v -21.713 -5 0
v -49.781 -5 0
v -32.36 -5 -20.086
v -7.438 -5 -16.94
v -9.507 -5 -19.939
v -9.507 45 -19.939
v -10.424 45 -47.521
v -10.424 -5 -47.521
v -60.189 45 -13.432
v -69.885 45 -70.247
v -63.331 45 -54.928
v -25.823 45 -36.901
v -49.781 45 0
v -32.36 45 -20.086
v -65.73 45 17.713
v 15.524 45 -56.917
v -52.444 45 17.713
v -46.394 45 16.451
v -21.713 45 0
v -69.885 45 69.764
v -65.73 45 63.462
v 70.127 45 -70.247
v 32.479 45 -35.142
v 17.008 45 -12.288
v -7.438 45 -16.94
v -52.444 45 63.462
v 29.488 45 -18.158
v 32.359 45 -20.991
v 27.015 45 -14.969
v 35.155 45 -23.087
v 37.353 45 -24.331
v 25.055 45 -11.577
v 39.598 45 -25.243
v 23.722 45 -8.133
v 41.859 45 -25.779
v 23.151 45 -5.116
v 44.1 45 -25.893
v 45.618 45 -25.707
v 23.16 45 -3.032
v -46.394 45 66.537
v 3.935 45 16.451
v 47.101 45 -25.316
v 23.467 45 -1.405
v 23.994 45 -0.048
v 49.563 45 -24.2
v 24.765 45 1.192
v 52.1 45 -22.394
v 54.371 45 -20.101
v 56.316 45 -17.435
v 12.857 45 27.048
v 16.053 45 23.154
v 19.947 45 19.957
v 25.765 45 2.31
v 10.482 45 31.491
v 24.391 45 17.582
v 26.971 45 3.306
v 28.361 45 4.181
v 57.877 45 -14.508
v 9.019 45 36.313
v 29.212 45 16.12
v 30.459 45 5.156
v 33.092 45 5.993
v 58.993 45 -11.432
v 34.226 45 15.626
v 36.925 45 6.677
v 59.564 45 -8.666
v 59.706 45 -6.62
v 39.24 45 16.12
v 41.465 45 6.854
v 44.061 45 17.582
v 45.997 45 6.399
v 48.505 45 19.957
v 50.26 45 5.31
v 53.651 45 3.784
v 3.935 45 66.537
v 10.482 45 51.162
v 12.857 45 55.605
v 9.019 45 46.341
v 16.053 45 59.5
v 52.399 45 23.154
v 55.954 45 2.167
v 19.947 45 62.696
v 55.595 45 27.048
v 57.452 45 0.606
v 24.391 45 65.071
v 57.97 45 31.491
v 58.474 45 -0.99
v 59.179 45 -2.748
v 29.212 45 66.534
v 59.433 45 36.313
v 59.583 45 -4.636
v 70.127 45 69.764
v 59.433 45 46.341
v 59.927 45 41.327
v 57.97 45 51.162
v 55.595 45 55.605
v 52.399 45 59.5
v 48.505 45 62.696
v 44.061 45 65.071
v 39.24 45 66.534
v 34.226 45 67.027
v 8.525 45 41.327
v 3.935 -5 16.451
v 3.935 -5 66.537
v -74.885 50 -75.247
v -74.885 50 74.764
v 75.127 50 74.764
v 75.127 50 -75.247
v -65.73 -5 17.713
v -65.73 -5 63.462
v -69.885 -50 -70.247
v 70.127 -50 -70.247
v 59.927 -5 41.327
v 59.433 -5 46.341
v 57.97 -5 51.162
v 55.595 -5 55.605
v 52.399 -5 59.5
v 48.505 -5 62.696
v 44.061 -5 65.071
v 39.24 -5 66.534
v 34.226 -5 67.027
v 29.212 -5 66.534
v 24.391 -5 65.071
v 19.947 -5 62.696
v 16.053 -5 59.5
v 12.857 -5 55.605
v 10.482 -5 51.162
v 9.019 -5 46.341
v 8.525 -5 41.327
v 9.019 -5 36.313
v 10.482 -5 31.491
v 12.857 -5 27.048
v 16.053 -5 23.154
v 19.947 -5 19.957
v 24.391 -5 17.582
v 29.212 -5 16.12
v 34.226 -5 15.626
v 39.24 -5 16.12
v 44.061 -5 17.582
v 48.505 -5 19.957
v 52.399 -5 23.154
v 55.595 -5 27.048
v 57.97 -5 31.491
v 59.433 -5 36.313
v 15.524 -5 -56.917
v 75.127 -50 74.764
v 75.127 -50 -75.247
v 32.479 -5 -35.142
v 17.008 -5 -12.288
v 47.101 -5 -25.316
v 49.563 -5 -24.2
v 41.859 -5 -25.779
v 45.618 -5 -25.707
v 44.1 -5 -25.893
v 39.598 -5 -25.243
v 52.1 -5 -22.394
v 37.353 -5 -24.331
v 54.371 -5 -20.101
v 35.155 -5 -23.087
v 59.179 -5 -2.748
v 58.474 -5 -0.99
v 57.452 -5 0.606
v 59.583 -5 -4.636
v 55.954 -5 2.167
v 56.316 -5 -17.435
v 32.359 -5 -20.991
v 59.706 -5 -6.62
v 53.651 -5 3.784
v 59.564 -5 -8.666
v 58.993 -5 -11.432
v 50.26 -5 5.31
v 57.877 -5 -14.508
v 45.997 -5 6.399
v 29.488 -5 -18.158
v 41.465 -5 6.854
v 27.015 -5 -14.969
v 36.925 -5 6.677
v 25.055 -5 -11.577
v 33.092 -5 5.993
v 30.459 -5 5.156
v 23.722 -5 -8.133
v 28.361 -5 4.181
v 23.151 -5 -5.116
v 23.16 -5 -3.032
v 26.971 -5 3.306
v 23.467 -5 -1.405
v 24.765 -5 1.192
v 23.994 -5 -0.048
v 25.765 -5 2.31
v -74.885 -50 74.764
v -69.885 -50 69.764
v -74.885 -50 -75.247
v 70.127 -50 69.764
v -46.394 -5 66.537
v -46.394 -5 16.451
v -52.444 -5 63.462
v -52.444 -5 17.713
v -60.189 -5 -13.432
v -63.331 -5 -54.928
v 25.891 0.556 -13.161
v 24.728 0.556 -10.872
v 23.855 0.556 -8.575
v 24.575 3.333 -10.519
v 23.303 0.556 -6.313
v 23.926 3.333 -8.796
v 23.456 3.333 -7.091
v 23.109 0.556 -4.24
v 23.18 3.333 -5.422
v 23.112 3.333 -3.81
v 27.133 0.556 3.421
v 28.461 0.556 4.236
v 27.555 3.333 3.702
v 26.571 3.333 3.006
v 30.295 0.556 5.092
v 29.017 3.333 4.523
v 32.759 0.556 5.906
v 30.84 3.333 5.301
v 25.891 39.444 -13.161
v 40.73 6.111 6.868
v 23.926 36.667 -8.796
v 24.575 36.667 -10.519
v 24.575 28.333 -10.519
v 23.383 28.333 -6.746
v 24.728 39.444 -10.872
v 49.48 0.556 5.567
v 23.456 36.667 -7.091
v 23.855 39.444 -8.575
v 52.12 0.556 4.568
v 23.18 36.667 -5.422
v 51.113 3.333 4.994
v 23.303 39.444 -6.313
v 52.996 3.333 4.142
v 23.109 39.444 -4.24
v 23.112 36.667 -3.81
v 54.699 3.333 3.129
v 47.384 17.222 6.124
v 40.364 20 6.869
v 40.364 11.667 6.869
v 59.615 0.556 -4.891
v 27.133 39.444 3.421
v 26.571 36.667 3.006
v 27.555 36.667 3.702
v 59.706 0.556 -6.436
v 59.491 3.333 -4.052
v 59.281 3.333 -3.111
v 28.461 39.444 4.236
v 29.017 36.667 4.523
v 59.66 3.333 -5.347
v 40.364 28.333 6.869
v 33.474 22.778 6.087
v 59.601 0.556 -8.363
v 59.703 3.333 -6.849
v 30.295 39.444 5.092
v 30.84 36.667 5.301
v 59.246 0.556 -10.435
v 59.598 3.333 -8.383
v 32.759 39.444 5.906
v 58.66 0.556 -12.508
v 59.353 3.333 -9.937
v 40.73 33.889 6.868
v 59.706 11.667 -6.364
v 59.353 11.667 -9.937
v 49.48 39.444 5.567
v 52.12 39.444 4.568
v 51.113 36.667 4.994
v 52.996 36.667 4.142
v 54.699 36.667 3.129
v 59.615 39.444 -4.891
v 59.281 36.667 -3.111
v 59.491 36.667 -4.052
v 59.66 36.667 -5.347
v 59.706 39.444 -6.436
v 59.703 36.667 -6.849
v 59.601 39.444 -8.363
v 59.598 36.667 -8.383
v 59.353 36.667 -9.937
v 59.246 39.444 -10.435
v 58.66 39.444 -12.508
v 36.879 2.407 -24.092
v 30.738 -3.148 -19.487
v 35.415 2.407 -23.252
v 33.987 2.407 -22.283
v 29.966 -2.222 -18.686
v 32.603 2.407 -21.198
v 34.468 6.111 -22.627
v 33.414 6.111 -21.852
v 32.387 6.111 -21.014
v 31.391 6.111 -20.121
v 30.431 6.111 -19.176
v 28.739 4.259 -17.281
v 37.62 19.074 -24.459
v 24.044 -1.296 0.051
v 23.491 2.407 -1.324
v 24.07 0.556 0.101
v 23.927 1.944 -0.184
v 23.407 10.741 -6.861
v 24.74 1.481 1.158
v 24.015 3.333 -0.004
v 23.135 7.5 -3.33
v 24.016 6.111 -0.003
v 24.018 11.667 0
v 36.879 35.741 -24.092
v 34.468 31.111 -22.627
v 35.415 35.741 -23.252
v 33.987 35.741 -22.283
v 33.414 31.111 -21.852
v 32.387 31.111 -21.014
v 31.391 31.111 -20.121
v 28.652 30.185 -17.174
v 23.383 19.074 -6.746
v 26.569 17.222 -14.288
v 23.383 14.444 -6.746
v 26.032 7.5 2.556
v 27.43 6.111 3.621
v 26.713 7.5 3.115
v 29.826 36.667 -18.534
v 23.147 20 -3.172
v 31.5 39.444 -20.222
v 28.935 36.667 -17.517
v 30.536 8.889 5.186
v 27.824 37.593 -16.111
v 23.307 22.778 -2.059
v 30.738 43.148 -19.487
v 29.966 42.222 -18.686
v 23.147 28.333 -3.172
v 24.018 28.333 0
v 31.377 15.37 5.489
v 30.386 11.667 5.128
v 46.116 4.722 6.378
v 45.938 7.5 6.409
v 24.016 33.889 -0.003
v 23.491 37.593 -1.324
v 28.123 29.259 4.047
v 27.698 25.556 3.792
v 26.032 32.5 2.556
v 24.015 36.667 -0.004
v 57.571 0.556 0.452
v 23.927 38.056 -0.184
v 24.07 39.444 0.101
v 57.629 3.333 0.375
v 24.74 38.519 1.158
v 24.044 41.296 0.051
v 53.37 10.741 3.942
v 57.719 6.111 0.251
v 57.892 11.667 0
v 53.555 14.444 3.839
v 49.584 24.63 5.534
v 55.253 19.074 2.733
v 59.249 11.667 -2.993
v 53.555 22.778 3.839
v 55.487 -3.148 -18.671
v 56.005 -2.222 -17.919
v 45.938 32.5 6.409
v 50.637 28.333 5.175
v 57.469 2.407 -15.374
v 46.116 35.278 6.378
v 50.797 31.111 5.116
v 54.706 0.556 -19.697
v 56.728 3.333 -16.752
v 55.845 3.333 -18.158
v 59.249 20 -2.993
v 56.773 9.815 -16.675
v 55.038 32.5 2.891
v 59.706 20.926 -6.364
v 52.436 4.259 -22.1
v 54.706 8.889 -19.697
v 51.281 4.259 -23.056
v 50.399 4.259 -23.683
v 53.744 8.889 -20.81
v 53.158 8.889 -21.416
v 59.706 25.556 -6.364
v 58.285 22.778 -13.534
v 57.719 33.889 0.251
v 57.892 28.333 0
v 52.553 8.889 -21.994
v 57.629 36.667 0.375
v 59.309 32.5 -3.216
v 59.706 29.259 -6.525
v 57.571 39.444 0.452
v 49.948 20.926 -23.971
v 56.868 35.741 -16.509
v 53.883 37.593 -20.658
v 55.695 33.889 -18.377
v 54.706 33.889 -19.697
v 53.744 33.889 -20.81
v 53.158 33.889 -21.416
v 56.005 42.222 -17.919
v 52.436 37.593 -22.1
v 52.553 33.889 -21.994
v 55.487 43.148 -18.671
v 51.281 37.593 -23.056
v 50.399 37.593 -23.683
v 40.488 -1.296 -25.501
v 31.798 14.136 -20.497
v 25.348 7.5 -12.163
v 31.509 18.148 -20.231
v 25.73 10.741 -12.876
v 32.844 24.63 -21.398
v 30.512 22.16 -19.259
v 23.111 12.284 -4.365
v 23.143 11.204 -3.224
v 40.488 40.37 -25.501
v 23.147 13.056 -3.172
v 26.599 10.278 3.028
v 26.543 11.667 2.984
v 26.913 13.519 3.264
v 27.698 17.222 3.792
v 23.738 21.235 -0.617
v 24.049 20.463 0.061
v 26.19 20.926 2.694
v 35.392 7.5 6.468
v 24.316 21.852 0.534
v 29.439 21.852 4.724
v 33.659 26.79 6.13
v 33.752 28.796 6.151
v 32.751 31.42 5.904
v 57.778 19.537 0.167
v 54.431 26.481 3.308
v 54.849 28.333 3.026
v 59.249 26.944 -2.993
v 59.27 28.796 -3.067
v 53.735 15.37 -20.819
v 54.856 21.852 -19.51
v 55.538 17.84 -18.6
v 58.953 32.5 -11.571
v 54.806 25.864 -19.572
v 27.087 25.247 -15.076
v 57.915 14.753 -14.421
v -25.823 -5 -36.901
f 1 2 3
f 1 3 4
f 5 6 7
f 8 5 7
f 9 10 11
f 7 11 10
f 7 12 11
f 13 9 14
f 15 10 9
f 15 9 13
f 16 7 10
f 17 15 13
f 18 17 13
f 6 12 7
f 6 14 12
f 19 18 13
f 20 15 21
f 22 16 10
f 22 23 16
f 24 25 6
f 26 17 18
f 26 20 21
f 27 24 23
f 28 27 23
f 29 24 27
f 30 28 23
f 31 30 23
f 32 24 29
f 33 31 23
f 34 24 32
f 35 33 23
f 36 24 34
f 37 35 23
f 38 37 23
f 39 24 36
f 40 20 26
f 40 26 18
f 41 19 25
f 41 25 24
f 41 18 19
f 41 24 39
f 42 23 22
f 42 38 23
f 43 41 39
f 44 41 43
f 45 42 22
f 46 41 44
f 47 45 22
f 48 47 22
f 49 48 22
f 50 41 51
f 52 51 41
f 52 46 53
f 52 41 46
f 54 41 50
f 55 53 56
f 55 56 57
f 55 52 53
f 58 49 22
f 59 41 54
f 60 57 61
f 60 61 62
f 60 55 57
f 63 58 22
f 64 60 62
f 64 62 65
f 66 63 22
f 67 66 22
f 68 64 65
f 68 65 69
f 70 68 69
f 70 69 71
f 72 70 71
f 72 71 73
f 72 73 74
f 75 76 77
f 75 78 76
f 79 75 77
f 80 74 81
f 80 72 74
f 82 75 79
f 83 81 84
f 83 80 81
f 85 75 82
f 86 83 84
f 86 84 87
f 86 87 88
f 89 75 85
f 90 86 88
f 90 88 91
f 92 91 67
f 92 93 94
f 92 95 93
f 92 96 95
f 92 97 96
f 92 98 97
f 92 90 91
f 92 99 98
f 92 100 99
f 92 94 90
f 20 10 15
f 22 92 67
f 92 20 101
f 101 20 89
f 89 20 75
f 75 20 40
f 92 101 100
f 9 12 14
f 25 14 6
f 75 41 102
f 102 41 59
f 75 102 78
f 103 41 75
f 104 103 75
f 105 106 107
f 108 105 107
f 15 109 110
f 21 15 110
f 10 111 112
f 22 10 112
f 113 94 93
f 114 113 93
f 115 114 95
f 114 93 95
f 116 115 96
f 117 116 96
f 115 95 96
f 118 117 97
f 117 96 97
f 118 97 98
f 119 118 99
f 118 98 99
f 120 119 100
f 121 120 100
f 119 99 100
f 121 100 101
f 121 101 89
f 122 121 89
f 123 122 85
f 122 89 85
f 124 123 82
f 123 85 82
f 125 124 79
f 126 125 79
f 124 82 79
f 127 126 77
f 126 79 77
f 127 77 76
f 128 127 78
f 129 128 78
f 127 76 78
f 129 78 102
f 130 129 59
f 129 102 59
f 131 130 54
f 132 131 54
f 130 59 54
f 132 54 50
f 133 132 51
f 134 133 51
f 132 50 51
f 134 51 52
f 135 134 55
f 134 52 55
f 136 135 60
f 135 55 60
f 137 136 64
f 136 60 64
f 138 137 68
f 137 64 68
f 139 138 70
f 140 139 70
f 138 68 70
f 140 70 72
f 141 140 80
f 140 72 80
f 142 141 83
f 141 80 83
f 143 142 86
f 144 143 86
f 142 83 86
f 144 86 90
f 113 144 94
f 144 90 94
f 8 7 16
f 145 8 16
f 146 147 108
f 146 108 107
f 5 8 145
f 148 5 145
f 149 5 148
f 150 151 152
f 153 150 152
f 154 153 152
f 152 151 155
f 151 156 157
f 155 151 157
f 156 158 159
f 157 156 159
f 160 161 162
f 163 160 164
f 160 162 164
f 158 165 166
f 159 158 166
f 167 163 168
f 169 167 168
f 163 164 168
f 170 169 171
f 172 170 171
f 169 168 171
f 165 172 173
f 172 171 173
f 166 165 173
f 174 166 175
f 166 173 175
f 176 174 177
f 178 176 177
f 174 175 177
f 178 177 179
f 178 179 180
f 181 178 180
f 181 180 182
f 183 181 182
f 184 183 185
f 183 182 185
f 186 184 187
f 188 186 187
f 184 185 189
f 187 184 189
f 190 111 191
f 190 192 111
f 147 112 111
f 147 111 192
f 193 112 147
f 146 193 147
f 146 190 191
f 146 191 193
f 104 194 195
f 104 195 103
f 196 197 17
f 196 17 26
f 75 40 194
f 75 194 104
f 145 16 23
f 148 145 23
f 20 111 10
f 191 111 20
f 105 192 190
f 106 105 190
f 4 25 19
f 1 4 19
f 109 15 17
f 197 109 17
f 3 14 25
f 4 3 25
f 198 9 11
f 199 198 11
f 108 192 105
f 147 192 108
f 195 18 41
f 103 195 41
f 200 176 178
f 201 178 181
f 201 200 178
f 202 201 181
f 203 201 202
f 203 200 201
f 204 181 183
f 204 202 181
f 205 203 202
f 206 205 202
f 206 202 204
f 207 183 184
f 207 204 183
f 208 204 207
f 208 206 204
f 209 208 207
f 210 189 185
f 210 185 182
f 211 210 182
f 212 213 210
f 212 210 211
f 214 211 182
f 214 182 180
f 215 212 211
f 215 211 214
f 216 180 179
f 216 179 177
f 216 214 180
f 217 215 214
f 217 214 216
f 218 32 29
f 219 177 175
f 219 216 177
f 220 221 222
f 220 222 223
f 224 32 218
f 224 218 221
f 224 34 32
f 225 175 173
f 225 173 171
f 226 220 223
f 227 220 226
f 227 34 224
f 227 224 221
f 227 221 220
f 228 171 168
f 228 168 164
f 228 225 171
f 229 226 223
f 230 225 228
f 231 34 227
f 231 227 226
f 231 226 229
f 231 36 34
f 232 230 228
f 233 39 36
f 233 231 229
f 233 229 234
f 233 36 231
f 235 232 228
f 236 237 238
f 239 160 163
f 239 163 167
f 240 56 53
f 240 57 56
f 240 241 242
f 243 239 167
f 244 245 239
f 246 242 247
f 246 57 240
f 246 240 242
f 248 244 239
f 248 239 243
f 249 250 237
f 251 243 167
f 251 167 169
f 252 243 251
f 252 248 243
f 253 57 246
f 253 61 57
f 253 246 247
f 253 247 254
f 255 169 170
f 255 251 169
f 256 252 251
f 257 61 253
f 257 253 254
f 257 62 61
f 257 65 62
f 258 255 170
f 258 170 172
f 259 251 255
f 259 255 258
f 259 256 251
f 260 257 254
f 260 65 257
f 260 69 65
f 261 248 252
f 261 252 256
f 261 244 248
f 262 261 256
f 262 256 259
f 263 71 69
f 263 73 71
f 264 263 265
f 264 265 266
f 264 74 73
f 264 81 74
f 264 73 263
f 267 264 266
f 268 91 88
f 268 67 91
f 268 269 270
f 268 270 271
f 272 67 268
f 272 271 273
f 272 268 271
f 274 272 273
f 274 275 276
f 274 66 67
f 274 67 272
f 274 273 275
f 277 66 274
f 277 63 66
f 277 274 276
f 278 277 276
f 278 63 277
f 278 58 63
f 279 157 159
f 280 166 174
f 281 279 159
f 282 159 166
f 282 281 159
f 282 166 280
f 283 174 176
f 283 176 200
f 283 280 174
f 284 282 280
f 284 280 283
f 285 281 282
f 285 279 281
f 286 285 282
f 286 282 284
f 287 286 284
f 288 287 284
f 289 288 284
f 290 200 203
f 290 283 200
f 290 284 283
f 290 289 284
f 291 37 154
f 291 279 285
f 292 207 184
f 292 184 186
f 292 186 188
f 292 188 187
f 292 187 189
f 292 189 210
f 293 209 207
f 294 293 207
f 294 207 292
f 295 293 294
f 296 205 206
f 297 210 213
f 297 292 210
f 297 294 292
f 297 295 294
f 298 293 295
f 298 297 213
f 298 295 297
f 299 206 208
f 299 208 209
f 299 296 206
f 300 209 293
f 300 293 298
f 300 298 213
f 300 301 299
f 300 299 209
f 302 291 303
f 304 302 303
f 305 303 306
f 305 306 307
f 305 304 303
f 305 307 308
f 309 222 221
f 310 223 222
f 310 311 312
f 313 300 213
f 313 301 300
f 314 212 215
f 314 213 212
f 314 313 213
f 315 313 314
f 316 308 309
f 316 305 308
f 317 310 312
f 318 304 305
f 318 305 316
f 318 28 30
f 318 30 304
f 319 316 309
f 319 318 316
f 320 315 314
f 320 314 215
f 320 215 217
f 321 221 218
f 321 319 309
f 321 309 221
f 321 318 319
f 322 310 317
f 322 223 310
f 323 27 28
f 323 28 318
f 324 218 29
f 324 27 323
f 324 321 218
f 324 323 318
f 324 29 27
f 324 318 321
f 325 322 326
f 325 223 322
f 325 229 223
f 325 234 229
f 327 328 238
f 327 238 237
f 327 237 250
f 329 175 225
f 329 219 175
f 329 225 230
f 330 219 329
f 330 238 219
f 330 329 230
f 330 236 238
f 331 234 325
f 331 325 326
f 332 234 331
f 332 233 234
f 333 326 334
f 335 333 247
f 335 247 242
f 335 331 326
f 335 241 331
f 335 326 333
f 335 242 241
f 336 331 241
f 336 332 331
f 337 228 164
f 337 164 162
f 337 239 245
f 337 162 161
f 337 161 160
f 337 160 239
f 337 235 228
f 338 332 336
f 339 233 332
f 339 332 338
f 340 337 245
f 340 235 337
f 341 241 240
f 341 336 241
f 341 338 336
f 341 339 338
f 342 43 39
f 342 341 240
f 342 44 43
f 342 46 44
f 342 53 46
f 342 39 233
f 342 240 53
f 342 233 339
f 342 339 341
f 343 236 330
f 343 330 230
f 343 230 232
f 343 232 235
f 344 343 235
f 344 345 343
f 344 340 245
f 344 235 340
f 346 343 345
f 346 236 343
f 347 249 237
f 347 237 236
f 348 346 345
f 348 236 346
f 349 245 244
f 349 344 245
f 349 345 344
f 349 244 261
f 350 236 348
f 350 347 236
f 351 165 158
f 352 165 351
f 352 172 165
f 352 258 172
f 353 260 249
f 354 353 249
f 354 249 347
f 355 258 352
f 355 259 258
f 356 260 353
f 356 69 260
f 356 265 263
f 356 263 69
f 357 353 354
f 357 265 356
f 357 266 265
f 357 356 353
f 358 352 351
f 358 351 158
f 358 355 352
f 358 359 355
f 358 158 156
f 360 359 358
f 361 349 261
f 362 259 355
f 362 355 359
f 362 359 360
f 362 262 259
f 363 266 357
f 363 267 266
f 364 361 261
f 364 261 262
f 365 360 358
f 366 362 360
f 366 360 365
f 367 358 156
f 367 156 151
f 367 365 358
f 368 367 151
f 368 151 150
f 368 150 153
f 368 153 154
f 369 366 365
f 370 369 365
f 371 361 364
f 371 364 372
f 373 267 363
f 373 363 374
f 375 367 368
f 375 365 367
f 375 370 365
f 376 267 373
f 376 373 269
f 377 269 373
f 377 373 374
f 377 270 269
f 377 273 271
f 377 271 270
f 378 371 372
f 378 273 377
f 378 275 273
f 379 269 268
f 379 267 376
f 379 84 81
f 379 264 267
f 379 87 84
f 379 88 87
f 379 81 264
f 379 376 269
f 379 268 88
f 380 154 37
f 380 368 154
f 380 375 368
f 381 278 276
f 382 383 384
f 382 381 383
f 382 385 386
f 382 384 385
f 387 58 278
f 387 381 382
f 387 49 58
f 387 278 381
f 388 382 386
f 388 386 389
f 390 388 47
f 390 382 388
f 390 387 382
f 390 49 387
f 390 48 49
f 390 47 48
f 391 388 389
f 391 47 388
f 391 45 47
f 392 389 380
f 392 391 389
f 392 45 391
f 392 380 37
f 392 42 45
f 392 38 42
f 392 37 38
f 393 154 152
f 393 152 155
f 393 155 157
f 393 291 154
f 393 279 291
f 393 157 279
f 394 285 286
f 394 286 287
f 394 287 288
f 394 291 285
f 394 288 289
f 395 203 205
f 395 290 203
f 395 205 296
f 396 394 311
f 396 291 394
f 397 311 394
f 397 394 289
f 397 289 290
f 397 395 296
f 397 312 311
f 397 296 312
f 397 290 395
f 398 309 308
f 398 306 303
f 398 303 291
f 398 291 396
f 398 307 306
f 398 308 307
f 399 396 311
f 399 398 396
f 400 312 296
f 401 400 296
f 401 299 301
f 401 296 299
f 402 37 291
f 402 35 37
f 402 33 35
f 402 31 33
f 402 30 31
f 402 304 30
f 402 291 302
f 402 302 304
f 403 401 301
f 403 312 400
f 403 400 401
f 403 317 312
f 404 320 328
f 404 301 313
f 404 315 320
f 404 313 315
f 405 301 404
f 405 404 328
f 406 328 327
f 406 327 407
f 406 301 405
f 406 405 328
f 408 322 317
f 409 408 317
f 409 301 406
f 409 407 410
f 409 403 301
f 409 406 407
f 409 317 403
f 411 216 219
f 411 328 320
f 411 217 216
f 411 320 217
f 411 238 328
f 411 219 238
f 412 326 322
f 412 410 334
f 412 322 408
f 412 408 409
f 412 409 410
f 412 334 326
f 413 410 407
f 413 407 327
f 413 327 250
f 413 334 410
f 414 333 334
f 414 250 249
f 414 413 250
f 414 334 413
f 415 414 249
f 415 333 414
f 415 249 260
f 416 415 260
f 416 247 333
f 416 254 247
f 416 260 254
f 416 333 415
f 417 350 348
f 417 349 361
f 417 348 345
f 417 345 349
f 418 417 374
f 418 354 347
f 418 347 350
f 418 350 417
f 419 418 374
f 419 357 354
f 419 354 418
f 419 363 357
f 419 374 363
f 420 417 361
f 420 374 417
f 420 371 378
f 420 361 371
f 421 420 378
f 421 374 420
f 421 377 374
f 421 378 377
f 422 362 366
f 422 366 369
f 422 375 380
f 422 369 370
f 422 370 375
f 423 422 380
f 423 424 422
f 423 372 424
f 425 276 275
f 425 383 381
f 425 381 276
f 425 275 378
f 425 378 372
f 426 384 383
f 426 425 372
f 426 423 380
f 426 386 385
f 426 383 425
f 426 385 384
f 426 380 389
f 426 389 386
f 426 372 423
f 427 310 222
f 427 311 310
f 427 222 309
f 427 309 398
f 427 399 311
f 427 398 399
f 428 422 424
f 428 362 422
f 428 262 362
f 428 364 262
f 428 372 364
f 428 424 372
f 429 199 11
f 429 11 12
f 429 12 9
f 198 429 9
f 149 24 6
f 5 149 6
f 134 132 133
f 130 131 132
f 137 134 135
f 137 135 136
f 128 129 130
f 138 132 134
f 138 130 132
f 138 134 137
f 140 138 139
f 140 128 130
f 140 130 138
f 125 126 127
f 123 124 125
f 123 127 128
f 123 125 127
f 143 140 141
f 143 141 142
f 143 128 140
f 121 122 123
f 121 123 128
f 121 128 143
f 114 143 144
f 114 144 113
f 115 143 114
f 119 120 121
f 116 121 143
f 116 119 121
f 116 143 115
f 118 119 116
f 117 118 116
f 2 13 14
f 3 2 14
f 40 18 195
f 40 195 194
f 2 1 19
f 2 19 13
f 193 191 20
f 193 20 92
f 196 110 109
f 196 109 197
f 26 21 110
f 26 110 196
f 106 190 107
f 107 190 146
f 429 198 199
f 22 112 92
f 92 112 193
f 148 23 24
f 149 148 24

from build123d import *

# Parameters (mm, degrees)
F0_W      = 150.0115171075
F0_H      = 150.0115022063
F1_DEPTH  = 50
F2_DEPTH  = 50
F3_T      = -5
F4_W      = 50.3282439895
F4_H      = 50.0862784684
F5_DEPTH  = 50
F6_R      = 25.7006976181
F7_DEPTH  = 50
F9_DEPTH  = 50
F11_DEPTH = 50
F12_W     = 13.2862403989
F12_H     = 45.7488838583
F13_DEPTH = 50
F15_DEPTH = 50
F17_DEPTH = 50


with BuildPart() as f1:
    # F0 (on Front) → F1 (new body)
    with BuildSketch(Plane.XZ):
        with Locations((0.1207850873, -0.2415664494)):
            Rectangle(F0_W, F0_H)
    extrude(amount=F1_DEPTH)

    # F2 (add): a face of the model
    f2_faces = [f1.faces().sort_by_distance(p)[0] for p in [
        (0.1207850873, 0, -0.2415664494),
    ]]
    extrude(f2_faces, amount=F2_DEPTH)

    # F3
    f3_openings = [f1.faces().sort_by_distance(p)[0] for p in [
        (0.120785, -50, -0.241566),
    ]]
    offset(amount=F3_T, openings=f3_openings)

    # F4 (on face) → F5 (join)
    with BuildSketch(Plane.XZ.offset(-45)):
        with Locations((-21.2294475641, 41.4939280599)):
            Rectangle(F4_W, F4_H)
    extrude(amount=F5_DEPTH)

    # F6 (on face) → F7 (join)
    with BuildSketch(Plane.XZ.offset(-45)):
        with Locations((34.225974232, 41.3267239928)):
            Circle(F6_R)
    extrude(amount=F7_DEPTH)

    # F8 (on face) → F9 (join)
    with BuildSketch(Plane.XZ.offset(-45)):
        Polygon((-25.8233335135, -36.9013702446), (-60.1888511064, -13.4322265214), (-63.3309669793, -54.9282096326), align=None)
    extrude(amount=F9_DEPTH)

    # F10 (on face) → F11 (join)
    with BuildSketch(Plane.XZ.offset(-45)):
        Polygon((32.4785027368, -35.1417758495), (17.0084361272, -12.288266328), (-9.5070565099, -19.9390511614), (-10.4244655785, -47.5210057505), (15.5240370727, -56.9168063293), align=None)
    extrude(amount=F11_DEPTH)

    # F12 (on face) → F13 (join)
    with BuildSketch(Plane.XZ.offset(-45)):
        with Locations((-59.0873472393, 40.5877782032)):
            Rectangle(F12_W, F12_H)
    extrude(amount=F13_DEPTH)

    # F14 (on face) → F15 (join)
    with BuildSketch(Plane.XZ.offset(-45)):
        Polygon((-49.7810505331, 0), (-32.3597341776, -20.085580647), (-7.4375732802, -16.9400647283), (-21.7133741826, 0), align=None)
    extrude(amount=F15_DEPTH)

    # F16 (on face) → F17 (join)
    with BuildSketch(Plane.XZ.offset(-45)):
        with BuildLine():
            add(Edge.make_bspline(
                [(44.1004857421, -25.8926860988), (32.8076134685, -26.462876483), (5.9337500795, 8.9077984279), (73.1779523154, 9.3996996285), (54.7857295651, -25.3531755887), (44.1004857421, -25.8926860988)],
                knots=[0, 0, 0, 0, 0.3375027868, 0.6806570126, 1, 1, 1, 1], degree=3))
        make_face()
    extrude(amount=F17_DEPTH)


solid = f1.part
